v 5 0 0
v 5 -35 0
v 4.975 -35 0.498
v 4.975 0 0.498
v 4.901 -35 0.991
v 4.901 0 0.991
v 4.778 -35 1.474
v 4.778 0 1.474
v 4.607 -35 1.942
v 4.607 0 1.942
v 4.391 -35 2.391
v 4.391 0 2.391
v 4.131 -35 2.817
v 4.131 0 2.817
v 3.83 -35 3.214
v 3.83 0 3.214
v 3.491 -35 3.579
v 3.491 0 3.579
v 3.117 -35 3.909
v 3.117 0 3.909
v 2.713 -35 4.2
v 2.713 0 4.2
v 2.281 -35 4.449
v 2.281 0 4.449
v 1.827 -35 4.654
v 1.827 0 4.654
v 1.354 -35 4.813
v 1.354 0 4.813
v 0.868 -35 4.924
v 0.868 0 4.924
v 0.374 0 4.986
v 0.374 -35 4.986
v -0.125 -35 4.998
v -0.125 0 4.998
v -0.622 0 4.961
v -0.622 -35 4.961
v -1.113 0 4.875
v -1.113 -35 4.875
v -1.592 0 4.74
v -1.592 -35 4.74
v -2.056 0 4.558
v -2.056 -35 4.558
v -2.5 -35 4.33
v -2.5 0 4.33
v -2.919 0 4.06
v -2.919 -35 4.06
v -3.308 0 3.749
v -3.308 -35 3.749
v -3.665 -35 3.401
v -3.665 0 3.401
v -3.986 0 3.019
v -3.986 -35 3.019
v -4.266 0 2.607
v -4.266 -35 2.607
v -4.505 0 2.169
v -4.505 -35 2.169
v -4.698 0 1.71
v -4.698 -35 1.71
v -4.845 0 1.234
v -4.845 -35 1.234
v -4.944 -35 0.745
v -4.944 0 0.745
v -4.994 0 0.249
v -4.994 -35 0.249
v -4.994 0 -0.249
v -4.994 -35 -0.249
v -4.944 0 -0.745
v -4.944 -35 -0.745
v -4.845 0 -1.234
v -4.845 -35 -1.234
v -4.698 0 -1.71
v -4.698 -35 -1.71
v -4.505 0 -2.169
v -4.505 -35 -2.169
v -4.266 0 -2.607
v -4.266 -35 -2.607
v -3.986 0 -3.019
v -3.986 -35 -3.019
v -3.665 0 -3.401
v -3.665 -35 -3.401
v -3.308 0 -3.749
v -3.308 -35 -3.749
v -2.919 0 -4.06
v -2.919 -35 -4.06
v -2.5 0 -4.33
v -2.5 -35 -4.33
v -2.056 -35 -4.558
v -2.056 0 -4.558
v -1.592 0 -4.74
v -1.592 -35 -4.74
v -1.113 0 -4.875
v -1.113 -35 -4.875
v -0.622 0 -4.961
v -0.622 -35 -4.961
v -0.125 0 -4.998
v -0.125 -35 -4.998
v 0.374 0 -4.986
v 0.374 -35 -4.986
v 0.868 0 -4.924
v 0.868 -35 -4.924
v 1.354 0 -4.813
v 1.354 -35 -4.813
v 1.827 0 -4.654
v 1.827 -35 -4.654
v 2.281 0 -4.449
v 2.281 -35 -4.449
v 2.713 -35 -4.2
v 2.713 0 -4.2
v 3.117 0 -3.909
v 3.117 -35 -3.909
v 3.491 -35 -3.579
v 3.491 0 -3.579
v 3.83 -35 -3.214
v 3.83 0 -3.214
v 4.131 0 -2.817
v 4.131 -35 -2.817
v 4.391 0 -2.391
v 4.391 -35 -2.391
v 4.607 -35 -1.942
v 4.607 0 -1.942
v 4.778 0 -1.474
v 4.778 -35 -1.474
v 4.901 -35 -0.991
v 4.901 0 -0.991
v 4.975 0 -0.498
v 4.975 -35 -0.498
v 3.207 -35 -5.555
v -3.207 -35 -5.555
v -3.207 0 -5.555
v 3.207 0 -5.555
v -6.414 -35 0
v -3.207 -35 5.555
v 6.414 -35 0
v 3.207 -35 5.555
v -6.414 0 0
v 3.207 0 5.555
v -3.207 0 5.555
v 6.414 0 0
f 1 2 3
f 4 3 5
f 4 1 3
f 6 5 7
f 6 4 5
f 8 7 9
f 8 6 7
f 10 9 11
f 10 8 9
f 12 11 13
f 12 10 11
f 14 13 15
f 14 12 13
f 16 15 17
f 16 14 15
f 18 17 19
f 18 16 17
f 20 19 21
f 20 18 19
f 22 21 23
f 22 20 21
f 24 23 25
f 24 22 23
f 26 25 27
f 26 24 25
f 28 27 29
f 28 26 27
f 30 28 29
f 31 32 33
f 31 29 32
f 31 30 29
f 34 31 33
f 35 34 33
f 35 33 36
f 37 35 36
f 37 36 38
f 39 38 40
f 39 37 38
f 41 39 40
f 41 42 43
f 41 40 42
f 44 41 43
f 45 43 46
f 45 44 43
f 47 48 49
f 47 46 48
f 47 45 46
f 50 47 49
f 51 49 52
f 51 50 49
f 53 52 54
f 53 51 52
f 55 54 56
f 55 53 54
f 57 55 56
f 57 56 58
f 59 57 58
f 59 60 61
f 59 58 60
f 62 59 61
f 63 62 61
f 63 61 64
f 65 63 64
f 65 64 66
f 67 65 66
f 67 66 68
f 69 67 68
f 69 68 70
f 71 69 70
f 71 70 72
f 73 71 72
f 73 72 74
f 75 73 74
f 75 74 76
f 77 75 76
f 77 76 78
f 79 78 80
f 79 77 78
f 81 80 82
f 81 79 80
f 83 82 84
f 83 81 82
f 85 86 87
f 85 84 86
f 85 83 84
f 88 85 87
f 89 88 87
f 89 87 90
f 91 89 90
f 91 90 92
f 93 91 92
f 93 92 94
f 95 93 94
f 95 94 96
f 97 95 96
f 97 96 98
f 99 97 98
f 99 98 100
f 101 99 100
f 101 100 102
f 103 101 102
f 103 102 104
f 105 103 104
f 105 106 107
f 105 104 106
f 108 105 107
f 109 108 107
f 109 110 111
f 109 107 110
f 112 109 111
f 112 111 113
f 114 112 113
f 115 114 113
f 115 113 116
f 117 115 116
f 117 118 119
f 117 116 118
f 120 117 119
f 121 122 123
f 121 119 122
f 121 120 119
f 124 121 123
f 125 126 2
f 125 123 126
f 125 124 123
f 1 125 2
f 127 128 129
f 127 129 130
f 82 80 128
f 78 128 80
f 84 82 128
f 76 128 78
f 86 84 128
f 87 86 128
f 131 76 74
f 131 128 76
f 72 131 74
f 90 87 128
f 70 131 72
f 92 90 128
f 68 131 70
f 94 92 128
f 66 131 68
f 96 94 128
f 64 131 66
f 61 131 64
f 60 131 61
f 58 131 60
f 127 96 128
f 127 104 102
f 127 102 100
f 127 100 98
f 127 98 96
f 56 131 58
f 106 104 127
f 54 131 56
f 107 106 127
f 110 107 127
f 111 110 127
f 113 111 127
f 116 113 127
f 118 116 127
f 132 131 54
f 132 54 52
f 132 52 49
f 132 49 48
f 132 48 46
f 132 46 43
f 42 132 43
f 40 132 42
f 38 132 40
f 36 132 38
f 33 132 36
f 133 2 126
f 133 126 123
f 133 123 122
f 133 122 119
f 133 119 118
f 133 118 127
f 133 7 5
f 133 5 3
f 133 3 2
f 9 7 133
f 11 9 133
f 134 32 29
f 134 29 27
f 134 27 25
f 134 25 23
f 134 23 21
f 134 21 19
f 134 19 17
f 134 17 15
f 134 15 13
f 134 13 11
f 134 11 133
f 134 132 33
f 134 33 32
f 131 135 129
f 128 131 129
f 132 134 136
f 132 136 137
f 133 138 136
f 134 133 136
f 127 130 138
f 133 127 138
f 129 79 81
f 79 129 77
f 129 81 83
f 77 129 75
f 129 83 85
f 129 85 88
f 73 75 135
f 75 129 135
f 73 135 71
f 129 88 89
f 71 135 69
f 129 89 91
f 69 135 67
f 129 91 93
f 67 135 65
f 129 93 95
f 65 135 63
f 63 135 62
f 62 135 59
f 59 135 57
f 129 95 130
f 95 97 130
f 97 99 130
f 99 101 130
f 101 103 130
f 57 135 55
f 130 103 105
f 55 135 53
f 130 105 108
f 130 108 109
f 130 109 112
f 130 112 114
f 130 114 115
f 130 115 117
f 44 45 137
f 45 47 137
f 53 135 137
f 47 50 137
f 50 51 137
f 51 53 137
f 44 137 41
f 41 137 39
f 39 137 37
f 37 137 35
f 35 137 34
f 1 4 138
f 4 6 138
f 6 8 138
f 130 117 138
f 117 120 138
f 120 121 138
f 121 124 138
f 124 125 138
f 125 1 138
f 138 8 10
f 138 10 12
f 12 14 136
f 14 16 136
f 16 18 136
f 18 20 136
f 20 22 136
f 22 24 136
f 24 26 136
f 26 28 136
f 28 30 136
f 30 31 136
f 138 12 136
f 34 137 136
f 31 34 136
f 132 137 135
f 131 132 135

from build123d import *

# Parameters (mm, degrees)
F1_DEPTH = 35
F2_R     = 5
F3_DEPTH = 52.2


with BuildPart() as f1:
    # F0 (on Front) → F1 (new body)
    with BuildSketch(Plane.XZ):
        Polygon((3.207181, 5.555), (-3.207181, 5.555), (-6.414361, 0), (-3.207181, -5.555), (3.207181, -5.555), (6.414361, 0), align=None)
    extrude(amount=F1_DEPTH)

    # F2 (on Front) → F3 (cut)
    with BuildSketch(Plane.XZ):
        Circle(F2_R)
    extrude(amount=F3_DEPTH, mode=Mode.SUBTRACT)


solid = f1.part
